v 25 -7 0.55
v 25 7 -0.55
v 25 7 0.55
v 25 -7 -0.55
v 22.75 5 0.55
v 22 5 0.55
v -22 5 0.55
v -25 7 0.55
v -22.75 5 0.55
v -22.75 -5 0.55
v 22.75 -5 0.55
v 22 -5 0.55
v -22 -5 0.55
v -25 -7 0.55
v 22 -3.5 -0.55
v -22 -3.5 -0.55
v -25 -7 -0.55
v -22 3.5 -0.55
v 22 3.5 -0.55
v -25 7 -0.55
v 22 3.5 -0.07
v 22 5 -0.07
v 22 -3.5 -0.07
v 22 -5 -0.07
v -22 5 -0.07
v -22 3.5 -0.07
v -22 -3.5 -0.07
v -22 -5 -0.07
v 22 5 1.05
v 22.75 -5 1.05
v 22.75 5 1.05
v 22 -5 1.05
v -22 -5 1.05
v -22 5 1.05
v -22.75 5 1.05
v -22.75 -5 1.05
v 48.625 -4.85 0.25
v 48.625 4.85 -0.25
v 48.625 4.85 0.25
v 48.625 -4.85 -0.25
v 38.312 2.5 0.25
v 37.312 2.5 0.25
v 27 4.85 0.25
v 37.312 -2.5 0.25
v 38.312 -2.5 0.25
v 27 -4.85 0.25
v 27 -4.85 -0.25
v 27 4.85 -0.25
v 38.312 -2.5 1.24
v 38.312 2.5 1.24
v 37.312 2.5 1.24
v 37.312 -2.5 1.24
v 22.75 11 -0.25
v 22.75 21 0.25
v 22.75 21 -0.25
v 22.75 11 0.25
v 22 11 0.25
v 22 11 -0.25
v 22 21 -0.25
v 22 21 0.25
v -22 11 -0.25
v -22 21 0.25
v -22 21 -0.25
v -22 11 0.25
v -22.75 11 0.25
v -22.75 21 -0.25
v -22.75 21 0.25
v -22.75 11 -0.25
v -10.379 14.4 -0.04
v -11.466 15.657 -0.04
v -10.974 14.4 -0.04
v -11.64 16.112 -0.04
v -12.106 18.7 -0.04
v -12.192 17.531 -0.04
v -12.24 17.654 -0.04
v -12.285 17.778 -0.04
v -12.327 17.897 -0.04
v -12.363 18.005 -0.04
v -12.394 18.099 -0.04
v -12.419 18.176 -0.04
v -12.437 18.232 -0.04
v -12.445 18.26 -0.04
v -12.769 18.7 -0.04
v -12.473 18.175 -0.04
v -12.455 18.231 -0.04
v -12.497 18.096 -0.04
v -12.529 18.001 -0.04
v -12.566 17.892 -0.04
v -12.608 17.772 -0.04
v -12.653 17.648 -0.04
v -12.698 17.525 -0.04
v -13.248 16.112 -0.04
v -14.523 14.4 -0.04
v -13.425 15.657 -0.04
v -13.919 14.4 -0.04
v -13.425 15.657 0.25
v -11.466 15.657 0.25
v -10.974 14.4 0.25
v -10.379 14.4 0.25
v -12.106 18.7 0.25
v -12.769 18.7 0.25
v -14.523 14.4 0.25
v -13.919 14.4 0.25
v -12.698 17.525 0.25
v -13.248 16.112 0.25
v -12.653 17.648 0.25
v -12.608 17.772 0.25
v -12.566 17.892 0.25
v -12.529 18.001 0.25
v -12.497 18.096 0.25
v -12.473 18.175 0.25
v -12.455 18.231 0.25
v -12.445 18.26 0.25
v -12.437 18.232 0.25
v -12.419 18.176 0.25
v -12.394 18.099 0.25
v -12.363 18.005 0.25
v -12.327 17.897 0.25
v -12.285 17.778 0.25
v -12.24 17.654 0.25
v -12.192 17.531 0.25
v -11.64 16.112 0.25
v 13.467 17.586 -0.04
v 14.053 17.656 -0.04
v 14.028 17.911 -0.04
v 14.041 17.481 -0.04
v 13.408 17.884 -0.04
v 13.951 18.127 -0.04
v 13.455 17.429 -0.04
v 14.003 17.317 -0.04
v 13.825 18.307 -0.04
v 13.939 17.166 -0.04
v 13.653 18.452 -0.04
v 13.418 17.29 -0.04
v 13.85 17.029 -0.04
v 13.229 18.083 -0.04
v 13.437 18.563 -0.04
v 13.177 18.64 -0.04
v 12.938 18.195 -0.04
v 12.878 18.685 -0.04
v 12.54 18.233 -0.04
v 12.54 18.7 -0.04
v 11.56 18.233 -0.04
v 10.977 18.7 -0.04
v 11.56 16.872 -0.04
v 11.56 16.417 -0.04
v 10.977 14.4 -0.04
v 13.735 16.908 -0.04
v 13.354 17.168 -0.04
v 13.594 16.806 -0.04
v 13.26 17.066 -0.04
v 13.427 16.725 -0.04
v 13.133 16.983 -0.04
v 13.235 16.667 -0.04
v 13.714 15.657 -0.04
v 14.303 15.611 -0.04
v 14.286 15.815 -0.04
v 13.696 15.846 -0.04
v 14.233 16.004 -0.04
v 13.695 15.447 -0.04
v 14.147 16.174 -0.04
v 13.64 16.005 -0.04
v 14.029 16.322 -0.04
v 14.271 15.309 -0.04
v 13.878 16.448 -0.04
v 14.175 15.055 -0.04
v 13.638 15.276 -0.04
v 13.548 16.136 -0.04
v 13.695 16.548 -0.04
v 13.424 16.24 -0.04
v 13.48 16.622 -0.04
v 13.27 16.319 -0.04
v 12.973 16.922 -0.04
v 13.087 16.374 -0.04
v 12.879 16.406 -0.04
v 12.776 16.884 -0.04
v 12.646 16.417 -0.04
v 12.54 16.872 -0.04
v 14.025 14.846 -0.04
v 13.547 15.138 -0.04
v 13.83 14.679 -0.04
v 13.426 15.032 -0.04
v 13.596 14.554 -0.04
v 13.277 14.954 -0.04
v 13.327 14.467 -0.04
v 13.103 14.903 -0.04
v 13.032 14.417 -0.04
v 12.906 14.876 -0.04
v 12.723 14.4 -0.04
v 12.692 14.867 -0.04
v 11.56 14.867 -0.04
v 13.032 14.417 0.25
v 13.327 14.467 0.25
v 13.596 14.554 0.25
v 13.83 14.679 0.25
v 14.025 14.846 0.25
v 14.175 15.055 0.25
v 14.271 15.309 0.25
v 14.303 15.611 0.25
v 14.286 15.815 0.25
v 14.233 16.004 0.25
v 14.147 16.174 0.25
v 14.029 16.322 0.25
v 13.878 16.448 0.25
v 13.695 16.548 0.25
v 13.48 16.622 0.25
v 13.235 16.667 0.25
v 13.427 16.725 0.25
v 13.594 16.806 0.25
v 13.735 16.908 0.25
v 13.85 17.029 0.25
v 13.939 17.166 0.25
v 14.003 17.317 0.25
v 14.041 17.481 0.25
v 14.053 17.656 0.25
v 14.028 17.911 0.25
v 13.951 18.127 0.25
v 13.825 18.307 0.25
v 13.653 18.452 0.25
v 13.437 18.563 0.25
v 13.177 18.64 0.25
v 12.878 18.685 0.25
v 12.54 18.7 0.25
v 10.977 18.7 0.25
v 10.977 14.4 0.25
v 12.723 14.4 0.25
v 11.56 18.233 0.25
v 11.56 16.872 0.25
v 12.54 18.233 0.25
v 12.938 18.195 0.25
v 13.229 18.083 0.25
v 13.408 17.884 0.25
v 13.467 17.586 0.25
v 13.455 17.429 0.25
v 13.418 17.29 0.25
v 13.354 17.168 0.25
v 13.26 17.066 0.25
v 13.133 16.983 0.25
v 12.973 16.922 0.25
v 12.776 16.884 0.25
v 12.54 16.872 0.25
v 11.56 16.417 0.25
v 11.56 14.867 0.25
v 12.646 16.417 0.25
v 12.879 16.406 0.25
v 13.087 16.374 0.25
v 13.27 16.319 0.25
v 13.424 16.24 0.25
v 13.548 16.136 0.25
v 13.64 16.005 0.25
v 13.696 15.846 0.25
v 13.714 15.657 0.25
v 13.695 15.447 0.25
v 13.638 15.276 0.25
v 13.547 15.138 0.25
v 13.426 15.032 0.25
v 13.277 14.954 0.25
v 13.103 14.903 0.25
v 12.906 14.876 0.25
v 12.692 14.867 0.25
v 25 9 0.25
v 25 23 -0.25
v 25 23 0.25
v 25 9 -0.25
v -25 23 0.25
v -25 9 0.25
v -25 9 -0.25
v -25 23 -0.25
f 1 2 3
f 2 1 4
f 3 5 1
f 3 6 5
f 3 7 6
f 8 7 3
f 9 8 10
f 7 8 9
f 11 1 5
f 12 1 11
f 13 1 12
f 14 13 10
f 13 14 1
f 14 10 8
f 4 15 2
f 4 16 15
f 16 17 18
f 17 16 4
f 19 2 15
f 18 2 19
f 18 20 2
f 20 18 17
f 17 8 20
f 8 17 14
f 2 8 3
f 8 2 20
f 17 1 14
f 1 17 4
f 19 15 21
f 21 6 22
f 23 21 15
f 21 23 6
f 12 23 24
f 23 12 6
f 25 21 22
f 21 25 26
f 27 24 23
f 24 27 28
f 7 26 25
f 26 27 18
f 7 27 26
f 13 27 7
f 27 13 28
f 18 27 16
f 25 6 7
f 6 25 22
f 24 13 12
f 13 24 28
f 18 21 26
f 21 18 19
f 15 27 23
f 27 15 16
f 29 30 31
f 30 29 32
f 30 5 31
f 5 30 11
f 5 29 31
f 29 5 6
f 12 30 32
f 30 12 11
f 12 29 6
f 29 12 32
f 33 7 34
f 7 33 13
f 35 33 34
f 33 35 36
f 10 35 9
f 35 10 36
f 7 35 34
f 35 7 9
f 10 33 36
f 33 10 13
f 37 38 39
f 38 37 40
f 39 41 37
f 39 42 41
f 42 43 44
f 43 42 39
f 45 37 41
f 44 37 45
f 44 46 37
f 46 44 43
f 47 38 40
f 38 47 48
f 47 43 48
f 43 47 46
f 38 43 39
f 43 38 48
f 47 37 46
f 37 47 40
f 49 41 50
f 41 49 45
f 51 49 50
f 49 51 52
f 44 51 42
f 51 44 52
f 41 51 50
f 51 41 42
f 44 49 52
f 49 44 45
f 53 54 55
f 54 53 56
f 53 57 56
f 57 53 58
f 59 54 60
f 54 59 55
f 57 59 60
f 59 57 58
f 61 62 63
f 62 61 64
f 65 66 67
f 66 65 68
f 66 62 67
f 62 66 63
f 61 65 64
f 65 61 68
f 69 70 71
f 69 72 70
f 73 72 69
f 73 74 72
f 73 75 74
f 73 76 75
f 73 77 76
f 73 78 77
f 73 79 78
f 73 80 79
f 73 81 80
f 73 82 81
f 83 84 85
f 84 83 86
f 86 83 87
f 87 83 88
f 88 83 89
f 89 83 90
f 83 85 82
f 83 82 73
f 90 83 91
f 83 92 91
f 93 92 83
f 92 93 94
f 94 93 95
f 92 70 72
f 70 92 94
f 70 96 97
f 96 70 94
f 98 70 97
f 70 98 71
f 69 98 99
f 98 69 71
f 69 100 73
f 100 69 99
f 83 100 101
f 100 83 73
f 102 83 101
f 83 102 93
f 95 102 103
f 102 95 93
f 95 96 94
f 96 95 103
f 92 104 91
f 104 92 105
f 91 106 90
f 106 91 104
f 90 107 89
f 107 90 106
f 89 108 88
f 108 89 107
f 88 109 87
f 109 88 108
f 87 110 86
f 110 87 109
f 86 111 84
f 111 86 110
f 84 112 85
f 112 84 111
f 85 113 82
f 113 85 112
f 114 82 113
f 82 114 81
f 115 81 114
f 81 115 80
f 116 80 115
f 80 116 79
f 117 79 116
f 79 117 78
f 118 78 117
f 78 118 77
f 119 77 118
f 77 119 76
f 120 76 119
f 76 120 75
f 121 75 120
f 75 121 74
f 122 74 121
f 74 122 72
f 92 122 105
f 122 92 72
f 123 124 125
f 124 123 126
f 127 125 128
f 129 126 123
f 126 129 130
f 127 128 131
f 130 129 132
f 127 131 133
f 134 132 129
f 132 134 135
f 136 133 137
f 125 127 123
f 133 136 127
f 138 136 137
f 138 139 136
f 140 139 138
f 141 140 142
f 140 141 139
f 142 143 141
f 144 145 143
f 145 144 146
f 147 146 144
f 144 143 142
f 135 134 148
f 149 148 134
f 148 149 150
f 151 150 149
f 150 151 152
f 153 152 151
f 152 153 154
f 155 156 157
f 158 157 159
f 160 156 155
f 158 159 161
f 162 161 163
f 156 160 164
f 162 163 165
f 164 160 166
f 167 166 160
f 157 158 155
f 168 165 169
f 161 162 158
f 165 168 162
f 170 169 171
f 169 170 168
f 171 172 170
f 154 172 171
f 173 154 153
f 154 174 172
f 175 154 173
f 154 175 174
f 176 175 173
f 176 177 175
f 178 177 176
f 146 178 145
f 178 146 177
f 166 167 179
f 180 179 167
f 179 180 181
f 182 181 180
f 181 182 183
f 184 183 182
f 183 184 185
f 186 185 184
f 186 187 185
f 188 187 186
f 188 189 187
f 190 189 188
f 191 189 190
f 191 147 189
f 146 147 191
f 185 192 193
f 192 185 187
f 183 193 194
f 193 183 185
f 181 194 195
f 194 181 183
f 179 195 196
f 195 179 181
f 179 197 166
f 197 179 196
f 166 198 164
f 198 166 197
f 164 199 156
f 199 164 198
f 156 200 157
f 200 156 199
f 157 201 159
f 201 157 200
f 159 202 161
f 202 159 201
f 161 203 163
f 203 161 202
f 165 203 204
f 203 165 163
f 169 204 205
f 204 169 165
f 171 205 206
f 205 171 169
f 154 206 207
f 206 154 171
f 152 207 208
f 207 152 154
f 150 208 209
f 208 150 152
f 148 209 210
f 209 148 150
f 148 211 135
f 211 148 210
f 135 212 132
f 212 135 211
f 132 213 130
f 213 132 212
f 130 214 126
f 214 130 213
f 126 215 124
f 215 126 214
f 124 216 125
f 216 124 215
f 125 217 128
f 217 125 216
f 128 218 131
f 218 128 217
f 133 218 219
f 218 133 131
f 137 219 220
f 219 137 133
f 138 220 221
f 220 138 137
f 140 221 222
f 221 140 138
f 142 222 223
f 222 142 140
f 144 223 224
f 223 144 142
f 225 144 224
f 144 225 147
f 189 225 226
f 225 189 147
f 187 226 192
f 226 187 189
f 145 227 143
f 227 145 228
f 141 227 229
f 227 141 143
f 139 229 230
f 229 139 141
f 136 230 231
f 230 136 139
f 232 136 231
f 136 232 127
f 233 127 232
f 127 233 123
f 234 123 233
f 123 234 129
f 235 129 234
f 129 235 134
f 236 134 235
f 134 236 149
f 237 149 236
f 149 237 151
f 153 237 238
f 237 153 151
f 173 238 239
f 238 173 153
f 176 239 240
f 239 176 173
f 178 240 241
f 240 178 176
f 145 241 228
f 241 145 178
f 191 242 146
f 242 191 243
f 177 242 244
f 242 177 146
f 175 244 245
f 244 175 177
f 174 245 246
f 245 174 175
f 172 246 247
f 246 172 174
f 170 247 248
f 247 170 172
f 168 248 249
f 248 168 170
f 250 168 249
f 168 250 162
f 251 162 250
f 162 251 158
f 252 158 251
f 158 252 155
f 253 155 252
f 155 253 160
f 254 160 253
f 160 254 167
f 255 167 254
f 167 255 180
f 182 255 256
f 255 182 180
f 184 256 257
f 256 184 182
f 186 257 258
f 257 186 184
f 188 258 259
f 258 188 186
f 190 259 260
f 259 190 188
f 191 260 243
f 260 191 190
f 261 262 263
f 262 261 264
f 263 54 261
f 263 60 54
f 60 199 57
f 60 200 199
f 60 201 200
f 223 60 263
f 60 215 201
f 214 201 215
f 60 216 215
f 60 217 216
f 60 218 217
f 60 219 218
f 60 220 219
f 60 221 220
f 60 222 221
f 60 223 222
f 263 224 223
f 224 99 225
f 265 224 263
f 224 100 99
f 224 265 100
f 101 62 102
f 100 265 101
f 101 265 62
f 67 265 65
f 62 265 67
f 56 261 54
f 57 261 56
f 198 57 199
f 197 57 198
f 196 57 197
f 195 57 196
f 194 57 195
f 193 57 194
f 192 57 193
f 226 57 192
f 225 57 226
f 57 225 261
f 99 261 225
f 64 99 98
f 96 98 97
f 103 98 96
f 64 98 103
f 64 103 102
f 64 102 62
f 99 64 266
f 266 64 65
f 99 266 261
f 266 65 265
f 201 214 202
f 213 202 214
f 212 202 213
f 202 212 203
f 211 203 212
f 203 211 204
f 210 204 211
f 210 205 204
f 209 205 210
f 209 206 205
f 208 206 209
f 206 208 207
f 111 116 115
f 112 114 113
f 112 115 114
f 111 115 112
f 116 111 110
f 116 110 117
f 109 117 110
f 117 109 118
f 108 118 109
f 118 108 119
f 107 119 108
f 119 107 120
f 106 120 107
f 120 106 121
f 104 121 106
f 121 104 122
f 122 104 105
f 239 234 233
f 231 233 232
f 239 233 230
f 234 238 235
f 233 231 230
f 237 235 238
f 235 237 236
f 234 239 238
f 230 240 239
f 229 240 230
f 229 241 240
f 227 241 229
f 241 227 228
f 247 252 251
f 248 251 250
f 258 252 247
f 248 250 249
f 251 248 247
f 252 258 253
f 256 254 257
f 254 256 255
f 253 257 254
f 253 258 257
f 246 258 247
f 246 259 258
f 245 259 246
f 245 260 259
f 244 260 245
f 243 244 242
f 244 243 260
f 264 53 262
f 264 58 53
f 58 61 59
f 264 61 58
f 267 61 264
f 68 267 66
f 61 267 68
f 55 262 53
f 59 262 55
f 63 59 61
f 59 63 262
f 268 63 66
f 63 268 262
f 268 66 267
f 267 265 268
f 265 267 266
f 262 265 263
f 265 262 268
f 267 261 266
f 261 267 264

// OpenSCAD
// slider_sign.scad

// 3 part:
//
// bottom, top, slider
// 
// top has little tabs that insert into bottom to hold together.
//

width = 50;
height = 14;

// slider fit gap in z dir
depth_gap = 0.05;

depth_slider = 0.5; // 1.25
depth_cover_lip = 0.5; // lip that goes over bit of slider vertically
depth_bottom = 0.5;

// internal space in 'top' for slider
//depth_top_space = depth_top - (depth_slider + depth_gap*2);
depth_top_space = depth_slider + 2 * depth_gap;

depth_top = depth_top_space + depth_cover_lip;

//text = ["open", "closed"];
text = ["A", "B"];

text_depth = 0.3;
text_size = 4.5;
text_y_adj = 1.6;

eps = 0.01;

tx = width / 2 + 2;
ty = 16;

gap = 0.1;

wall_thickness = [3, 2];

reg_dim = [0.75, height - wall_thickness[1]*2, 0];

// vertical overlap of top piece over slider (stop it falling out!)
slider_cover_vert_amount = 1.5;

grip_y_gap = 1;
slider_y_gap = 0.3;

slider_grip_dim = [1, height - (wall_thickness[1] + slider_cover_vert_amount + grip_y_gap)*2, 1];


module top() {
    ww = width - wall_thickness[0]*2;
    hh = height - wall_thickness[1]*2;
    
    difference() {
        cube([width, height, depth_top], center = true);
        // subtract main space for slider
        translate([0, 0, depth_top/2 - depth_slider/2 - depth_gap - eps])
            cube([ww, hh, depth_slider + depth_gap*2 + eps*2], center = true);
        // subtract window (smaller vertically so slider doesn't fall out)
       
        cube([ww, hh - slider_cover_vert_amount*2, 10], center=true);
//        slider_cover_vert_amount
    }
    
    // reg keys
    for (i = [-1 : 2 : 1]) {
        scale([i, 1, 1])
            translate([-width/2 + wall_thickness[0] - reg_dim[0]/2, 0, (depth_top + depth_bottom)/2])
                cube([reg_dim[0], reg_dim[1], depth_bottom], center=true);
    }
}

module bottom() {
    difference() {
        cube([width, height, depth_bottom], center = true);
        union() {
            // texts
            translate([-width/4, -text_y_adj, depth_bottom / 2 + eps - text_depth])
                linear_extrude(text_depth)
                    text(text[0], text_size, halign="center");
            translate([width/4, -text_y_adj, depth_bottom / 2 + eps - text_depth])
                linear_extrude(text_depth)
                    text(text[1], text_size, halign="center");
            // reg holes
            for (i = [-1 : 2 : 1]) {
                scale([i, 1, 1])
                    translate([-width/2 + wall_thickness[0] - reg_dim[0]/2, 0, 0])
                        cube([reg_dim[0], reg_dim[1], 2], center=true);
            }
        }
    }
}

module slider() {
    ww = (width - wall_thickness[0]*2 - reg_dim[0]) / 2;
    hh = height - wall_thickness[1]*2 - slider_y_gap;
    translate([ww/2, 0, 0]) {
        cube([ww, hh, depth_slider], center=true);
        translate([0, 0, depth_slider/2 + slider_grip_dim[2]/2 - eps])
            // make make a cylinder knob later? or just round this rect off
            cube(slider_grip_dim, center = true);
    }
}

//slider();

//translate([tx, ty, 0])
//    slider();


translate([0, 0, 0])
    top();

translate([tx, 0, 0])
    slider();

translate([0, ty, 0])
    bottom();

//translate([0, -ty, 0])
//    slider();
